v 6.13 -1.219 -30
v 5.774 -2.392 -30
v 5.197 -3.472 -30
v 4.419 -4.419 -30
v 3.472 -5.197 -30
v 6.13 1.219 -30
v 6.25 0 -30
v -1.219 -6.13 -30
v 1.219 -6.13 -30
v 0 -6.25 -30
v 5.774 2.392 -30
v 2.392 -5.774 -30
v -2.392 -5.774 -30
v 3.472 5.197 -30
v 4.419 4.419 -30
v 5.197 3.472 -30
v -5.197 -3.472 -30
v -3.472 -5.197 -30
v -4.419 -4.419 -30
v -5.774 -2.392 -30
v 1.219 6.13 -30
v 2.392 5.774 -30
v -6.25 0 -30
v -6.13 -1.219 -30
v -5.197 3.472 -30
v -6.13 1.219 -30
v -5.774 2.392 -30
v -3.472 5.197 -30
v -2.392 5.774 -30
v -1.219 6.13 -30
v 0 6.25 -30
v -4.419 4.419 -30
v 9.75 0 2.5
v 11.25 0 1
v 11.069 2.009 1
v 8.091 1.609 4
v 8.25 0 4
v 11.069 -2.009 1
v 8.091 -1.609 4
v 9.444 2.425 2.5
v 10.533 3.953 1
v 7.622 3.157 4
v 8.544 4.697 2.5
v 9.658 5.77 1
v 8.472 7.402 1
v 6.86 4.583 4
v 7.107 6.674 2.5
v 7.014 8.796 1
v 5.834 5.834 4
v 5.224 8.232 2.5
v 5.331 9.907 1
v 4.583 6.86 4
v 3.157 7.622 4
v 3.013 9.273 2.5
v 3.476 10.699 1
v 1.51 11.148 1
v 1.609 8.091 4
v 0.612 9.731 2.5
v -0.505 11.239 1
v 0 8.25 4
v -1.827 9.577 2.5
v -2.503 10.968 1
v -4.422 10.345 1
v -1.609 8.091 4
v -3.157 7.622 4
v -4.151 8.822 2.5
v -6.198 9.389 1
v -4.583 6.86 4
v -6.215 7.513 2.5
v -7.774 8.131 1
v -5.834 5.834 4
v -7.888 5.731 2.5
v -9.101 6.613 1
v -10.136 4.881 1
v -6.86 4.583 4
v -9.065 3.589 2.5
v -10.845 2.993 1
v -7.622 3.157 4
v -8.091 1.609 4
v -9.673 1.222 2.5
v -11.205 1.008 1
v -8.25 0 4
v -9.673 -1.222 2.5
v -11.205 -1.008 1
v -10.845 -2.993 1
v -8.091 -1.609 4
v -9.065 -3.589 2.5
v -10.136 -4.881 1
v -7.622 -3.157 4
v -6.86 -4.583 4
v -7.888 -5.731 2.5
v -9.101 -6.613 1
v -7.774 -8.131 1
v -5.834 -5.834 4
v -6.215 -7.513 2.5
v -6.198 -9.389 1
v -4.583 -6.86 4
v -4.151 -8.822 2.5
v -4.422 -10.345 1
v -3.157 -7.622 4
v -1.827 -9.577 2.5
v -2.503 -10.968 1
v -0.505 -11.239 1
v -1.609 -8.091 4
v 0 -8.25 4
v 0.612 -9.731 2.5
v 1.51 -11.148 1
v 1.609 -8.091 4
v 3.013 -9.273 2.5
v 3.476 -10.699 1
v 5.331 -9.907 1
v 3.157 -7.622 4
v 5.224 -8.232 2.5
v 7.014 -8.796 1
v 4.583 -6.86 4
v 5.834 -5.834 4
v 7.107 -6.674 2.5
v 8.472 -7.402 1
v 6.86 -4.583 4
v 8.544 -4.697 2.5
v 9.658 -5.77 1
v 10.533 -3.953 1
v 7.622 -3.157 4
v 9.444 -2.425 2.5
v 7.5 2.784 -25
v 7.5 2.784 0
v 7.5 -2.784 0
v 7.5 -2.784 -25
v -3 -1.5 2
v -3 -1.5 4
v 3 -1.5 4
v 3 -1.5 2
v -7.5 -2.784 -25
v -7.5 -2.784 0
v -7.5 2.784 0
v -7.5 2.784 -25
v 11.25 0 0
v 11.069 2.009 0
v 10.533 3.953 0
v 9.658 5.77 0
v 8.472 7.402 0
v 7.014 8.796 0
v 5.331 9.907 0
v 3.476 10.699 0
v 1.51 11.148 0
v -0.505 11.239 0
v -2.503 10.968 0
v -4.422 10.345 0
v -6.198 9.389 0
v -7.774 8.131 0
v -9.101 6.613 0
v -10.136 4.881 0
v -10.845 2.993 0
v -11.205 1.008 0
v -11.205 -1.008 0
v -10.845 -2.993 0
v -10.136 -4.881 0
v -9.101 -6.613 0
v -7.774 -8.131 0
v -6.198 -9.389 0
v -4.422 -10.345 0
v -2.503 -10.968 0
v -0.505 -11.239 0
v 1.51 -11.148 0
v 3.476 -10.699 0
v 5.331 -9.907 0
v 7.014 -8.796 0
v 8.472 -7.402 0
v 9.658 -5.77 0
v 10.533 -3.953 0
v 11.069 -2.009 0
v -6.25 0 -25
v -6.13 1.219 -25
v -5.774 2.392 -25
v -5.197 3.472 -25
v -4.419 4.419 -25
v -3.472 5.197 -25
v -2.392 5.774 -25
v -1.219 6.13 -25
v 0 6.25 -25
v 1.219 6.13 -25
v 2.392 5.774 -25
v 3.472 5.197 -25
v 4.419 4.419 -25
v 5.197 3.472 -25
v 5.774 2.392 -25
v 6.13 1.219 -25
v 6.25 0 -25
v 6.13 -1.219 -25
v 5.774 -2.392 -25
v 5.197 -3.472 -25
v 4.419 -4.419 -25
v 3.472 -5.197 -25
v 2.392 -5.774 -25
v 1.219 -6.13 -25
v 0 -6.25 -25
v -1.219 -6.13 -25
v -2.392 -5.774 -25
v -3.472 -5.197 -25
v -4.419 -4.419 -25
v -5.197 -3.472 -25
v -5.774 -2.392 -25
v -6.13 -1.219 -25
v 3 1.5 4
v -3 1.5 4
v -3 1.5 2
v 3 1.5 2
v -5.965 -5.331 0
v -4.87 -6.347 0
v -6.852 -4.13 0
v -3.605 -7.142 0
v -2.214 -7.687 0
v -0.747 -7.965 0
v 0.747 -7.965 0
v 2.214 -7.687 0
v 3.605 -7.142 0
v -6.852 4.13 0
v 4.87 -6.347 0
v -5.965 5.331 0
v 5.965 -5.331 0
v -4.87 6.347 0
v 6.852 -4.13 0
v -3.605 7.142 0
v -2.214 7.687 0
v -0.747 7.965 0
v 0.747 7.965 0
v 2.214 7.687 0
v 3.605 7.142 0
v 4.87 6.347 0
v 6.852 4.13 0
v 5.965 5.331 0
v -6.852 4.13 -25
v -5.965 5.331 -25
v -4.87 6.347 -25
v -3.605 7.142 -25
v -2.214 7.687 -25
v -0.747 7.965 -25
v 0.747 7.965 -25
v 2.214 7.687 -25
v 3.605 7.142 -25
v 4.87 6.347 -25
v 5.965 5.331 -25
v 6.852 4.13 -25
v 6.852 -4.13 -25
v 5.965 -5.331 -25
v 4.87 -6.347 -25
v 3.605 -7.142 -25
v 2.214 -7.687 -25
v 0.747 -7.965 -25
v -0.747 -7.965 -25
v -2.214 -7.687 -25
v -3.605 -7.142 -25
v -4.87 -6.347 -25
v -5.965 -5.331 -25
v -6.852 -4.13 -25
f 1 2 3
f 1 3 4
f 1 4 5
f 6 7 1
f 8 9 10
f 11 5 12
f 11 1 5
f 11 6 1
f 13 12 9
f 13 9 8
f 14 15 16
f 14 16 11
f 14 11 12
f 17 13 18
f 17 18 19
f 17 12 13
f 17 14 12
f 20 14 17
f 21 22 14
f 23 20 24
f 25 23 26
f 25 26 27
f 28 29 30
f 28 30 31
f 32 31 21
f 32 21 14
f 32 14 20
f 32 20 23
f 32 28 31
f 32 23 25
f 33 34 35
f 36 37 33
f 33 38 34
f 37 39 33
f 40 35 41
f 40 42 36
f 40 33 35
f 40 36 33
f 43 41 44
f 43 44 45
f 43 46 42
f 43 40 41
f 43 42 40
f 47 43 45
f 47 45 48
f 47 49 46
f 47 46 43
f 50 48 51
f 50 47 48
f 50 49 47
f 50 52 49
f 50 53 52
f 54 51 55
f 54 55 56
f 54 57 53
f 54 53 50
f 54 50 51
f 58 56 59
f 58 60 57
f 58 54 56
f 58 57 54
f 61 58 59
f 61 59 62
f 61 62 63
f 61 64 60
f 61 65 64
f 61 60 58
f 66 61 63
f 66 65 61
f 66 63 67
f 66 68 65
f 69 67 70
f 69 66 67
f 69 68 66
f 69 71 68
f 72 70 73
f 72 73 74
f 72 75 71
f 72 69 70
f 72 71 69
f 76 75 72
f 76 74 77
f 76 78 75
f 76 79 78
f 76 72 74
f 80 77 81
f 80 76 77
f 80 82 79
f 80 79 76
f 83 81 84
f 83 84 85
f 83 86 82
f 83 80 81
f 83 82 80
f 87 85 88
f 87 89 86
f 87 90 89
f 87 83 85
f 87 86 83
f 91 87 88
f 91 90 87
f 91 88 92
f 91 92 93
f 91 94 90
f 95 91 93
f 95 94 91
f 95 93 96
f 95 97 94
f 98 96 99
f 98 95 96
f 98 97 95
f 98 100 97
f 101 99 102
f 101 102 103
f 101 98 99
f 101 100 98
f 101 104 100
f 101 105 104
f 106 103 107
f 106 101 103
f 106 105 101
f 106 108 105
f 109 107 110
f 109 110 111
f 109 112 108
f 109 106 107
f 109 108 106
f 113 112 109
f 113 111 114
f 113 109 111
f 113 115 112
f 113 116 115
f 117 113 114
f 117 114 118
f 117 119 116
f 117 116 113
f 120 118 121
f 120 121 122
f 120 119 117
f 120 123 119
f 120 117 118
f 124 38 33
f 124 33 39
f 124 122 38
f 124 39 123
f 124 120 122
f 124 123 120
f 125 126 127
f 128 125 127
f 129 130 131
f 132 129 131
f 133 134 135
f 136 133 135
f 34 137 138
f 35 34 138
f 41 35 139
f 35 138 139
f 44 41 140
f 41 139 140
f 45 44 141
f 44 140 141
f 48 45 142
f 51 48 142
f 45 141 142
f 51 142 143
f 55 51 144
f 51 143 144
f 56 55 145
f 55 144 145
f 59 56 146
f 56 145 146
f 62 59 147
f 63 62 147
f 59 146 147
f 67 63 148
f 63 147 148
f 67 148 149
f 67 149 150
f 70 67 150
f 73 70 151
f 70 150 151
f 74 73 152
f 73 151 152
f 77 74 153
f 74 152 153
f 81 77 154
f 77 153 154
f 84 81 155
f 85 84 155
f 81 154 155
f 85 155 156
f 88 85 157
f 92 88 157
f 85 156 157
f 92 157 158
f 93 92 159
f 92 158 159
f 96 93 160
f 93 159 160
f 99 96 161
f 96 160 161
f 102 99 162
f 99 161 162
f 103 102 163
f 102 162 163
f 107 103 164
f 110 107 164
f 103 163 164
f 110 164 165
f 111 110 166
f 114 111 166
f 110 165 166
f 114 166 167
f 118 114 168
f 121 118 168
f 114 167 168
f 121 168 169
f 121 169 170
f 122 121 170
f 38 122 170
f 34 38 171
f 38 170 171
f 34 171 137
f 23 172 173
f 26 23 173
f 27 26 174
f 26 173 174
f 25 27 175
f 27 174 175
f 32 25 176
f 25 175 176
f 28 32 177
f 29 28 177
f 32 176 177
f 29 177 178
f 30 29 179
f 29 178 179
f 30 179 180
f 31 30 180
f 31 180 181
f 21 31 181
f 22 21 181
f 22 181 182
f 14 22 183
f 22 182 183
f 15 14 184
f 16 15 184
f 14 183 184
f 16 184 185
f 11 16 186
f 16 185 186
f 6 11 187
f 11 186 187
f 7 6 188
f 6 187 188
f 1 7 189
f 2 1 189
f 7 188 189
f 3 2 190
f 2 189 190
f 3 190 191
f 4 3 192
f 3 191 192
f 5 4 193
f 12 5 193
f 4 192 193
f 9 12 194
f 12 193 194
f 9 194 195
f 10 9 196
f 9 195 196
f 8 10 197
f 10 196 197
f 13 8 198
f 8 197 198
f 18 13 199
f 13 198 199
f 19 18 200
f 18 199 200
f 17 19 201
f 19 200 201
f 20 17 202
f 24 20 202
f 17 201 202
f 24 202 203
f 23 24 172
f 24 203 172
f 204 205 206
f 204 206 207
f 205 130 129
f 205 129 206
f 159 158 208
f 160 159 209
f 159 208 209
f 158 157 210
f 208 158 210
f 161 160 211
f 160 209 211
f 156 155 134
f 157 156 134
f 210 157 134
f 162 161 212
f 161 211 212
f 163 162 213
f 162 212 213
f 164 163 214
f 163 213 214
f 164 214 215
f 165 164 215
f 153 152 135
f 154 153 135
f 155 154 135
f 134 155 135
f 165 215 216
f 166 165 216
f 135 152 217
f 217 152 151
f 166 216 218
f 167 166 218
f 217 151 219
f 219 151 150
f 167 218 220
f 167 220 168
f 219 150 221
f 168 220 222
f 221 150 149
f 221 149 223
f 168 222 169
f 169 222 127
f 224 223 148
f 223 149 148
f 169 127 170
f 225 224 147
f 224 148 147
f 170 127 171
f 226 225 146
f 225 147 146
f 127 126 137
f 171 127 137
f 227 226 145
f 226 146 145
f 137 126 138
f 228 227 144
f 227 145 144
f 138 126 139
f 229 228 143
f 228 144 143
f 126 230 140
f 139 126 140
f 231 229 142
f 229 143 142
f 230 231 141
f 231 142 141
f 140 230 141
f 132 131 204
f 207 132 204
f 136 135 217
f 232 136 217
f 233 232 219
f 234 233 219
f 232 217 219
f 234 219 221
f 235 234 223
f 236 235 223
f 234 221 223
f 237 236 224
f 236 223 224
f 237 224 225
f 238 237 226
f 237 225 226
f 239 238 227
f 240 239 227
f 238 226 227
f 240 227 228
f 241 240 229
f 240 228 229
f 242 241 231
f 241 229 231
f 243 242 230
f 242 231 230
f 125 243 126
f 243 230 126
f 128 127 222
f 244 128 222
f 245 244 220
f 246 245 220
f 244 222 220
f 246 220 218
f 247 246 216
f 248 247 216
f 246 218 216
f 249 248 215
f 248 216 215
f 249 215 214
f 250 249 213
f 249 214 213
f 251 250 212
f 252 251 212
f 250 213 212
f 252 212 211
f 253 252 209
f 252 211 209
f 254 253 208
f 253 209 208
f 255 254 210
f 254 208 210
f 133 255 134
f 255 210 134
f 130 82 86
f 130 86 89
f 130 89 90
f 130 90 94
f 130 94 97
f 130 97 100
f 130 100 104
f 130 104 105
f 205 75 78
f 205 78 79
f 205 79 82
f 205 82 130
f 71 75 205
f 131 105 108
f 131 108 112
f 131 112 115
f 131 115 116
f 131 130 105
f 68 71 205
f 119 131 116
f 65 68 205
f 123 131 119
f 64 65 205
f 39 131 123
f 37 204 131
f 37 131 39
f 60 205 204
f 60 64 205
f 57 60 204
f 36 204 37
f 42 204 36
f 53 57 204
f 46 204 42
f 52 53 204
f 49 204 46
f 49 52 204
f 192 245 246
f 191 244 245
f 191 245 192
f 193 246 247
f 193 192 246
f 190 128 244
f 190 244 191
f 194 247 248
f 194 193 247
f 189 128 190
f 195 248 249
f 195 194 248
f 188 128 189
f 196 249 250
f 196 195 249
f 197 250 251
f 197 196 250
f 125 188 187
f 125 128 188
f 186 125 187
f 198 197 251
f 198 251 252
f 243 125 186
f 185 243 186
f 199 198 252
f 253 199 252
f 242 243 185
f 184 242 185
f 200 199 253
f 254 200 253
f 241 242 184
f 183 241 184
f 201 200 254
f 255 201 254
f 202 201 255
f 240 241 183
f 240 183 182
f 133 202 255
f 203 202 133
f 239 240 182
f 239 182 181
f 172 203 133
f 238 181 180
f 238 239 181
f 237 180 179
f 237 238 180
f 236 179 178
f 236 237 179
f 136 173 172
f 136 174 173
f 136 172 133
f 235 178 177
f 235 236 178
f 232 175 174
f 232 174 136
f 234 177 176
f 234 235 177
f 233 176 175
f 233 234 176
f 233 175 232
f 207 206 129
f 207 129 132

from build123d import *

# Parameters (mm, degrees)
SKETCH_1_R          = 11.25
EXTRUDE_1_DEPTH     = 4
CHAMFER_1_SIZE      = 3
SKETCH_2_W          = 6
SKETCH_2_H          = 3
CUT_EXTRUDE_1_DEPTH = 2
EXTRUDE_2_DEPTH     = 25
SKETCH_4_R          = 6.25
EXTRUDE_3_DEPTH     = 5


with BuildPart() as part:
    # 草图1 → 拉伸1 (new body)
    with BuildSketch(Plane.XY):
        Circle(SKETCH_1_R)
    extrude(amount=EXTRUDE_1_DEPTH)

    # 倒角1
    chamfer_1_edges = [part.edges().sort_by_distance(p)[0] for p in [
        (-11.25, 0, 4),
    ]]
    chamfer(chamfer_1_edges, length=CHAMFER_1_SIZE)

    # 草图2 → 切除-拉伸1 (cut)
    with BuildSketch(Plane.XY.offset(4)):
        Rectangle(SKETCH_2_W, SKETCH_2_H)
    extrude(amount=-CUT_EXTRUDE_1_DEPTH, mode=Mode.SUBTRACT)

    # 草图3 → 拉伸2 (add)
    with BuildSketch(Plane(origin=(0, 0, 0), x_dir=(-1, 0, 0), z_dir=(0, 0, -1))):
        with BuildLine():
            Line((-7.5, 2.783882181), (-7.5, -2.783882181))
            ThreePointArc((-7.5, -2.783882181), (0, -8), (7.5, -2.783882181))
            Line((7.5, -2.783882181), (7.5, 2.783882181))
            ThreePointArc((7.5, 2.783882181), (0, 8), (-7.5, 2.783882181))
        make_face()
    extrude(amount=EXTRUDE_2_DEPTH)

    # 草图4 → 拉伸3 (add)
    with BuildSketch(Plane(origin=(0, 0, -25), x_dir=(-1, 0, 0), z_dir=(0, 0, -1))):
        Circle(SKETCH_4_R)
    extrude(amount=EXTRUDE_3_DEPTH)


solid = part.part
